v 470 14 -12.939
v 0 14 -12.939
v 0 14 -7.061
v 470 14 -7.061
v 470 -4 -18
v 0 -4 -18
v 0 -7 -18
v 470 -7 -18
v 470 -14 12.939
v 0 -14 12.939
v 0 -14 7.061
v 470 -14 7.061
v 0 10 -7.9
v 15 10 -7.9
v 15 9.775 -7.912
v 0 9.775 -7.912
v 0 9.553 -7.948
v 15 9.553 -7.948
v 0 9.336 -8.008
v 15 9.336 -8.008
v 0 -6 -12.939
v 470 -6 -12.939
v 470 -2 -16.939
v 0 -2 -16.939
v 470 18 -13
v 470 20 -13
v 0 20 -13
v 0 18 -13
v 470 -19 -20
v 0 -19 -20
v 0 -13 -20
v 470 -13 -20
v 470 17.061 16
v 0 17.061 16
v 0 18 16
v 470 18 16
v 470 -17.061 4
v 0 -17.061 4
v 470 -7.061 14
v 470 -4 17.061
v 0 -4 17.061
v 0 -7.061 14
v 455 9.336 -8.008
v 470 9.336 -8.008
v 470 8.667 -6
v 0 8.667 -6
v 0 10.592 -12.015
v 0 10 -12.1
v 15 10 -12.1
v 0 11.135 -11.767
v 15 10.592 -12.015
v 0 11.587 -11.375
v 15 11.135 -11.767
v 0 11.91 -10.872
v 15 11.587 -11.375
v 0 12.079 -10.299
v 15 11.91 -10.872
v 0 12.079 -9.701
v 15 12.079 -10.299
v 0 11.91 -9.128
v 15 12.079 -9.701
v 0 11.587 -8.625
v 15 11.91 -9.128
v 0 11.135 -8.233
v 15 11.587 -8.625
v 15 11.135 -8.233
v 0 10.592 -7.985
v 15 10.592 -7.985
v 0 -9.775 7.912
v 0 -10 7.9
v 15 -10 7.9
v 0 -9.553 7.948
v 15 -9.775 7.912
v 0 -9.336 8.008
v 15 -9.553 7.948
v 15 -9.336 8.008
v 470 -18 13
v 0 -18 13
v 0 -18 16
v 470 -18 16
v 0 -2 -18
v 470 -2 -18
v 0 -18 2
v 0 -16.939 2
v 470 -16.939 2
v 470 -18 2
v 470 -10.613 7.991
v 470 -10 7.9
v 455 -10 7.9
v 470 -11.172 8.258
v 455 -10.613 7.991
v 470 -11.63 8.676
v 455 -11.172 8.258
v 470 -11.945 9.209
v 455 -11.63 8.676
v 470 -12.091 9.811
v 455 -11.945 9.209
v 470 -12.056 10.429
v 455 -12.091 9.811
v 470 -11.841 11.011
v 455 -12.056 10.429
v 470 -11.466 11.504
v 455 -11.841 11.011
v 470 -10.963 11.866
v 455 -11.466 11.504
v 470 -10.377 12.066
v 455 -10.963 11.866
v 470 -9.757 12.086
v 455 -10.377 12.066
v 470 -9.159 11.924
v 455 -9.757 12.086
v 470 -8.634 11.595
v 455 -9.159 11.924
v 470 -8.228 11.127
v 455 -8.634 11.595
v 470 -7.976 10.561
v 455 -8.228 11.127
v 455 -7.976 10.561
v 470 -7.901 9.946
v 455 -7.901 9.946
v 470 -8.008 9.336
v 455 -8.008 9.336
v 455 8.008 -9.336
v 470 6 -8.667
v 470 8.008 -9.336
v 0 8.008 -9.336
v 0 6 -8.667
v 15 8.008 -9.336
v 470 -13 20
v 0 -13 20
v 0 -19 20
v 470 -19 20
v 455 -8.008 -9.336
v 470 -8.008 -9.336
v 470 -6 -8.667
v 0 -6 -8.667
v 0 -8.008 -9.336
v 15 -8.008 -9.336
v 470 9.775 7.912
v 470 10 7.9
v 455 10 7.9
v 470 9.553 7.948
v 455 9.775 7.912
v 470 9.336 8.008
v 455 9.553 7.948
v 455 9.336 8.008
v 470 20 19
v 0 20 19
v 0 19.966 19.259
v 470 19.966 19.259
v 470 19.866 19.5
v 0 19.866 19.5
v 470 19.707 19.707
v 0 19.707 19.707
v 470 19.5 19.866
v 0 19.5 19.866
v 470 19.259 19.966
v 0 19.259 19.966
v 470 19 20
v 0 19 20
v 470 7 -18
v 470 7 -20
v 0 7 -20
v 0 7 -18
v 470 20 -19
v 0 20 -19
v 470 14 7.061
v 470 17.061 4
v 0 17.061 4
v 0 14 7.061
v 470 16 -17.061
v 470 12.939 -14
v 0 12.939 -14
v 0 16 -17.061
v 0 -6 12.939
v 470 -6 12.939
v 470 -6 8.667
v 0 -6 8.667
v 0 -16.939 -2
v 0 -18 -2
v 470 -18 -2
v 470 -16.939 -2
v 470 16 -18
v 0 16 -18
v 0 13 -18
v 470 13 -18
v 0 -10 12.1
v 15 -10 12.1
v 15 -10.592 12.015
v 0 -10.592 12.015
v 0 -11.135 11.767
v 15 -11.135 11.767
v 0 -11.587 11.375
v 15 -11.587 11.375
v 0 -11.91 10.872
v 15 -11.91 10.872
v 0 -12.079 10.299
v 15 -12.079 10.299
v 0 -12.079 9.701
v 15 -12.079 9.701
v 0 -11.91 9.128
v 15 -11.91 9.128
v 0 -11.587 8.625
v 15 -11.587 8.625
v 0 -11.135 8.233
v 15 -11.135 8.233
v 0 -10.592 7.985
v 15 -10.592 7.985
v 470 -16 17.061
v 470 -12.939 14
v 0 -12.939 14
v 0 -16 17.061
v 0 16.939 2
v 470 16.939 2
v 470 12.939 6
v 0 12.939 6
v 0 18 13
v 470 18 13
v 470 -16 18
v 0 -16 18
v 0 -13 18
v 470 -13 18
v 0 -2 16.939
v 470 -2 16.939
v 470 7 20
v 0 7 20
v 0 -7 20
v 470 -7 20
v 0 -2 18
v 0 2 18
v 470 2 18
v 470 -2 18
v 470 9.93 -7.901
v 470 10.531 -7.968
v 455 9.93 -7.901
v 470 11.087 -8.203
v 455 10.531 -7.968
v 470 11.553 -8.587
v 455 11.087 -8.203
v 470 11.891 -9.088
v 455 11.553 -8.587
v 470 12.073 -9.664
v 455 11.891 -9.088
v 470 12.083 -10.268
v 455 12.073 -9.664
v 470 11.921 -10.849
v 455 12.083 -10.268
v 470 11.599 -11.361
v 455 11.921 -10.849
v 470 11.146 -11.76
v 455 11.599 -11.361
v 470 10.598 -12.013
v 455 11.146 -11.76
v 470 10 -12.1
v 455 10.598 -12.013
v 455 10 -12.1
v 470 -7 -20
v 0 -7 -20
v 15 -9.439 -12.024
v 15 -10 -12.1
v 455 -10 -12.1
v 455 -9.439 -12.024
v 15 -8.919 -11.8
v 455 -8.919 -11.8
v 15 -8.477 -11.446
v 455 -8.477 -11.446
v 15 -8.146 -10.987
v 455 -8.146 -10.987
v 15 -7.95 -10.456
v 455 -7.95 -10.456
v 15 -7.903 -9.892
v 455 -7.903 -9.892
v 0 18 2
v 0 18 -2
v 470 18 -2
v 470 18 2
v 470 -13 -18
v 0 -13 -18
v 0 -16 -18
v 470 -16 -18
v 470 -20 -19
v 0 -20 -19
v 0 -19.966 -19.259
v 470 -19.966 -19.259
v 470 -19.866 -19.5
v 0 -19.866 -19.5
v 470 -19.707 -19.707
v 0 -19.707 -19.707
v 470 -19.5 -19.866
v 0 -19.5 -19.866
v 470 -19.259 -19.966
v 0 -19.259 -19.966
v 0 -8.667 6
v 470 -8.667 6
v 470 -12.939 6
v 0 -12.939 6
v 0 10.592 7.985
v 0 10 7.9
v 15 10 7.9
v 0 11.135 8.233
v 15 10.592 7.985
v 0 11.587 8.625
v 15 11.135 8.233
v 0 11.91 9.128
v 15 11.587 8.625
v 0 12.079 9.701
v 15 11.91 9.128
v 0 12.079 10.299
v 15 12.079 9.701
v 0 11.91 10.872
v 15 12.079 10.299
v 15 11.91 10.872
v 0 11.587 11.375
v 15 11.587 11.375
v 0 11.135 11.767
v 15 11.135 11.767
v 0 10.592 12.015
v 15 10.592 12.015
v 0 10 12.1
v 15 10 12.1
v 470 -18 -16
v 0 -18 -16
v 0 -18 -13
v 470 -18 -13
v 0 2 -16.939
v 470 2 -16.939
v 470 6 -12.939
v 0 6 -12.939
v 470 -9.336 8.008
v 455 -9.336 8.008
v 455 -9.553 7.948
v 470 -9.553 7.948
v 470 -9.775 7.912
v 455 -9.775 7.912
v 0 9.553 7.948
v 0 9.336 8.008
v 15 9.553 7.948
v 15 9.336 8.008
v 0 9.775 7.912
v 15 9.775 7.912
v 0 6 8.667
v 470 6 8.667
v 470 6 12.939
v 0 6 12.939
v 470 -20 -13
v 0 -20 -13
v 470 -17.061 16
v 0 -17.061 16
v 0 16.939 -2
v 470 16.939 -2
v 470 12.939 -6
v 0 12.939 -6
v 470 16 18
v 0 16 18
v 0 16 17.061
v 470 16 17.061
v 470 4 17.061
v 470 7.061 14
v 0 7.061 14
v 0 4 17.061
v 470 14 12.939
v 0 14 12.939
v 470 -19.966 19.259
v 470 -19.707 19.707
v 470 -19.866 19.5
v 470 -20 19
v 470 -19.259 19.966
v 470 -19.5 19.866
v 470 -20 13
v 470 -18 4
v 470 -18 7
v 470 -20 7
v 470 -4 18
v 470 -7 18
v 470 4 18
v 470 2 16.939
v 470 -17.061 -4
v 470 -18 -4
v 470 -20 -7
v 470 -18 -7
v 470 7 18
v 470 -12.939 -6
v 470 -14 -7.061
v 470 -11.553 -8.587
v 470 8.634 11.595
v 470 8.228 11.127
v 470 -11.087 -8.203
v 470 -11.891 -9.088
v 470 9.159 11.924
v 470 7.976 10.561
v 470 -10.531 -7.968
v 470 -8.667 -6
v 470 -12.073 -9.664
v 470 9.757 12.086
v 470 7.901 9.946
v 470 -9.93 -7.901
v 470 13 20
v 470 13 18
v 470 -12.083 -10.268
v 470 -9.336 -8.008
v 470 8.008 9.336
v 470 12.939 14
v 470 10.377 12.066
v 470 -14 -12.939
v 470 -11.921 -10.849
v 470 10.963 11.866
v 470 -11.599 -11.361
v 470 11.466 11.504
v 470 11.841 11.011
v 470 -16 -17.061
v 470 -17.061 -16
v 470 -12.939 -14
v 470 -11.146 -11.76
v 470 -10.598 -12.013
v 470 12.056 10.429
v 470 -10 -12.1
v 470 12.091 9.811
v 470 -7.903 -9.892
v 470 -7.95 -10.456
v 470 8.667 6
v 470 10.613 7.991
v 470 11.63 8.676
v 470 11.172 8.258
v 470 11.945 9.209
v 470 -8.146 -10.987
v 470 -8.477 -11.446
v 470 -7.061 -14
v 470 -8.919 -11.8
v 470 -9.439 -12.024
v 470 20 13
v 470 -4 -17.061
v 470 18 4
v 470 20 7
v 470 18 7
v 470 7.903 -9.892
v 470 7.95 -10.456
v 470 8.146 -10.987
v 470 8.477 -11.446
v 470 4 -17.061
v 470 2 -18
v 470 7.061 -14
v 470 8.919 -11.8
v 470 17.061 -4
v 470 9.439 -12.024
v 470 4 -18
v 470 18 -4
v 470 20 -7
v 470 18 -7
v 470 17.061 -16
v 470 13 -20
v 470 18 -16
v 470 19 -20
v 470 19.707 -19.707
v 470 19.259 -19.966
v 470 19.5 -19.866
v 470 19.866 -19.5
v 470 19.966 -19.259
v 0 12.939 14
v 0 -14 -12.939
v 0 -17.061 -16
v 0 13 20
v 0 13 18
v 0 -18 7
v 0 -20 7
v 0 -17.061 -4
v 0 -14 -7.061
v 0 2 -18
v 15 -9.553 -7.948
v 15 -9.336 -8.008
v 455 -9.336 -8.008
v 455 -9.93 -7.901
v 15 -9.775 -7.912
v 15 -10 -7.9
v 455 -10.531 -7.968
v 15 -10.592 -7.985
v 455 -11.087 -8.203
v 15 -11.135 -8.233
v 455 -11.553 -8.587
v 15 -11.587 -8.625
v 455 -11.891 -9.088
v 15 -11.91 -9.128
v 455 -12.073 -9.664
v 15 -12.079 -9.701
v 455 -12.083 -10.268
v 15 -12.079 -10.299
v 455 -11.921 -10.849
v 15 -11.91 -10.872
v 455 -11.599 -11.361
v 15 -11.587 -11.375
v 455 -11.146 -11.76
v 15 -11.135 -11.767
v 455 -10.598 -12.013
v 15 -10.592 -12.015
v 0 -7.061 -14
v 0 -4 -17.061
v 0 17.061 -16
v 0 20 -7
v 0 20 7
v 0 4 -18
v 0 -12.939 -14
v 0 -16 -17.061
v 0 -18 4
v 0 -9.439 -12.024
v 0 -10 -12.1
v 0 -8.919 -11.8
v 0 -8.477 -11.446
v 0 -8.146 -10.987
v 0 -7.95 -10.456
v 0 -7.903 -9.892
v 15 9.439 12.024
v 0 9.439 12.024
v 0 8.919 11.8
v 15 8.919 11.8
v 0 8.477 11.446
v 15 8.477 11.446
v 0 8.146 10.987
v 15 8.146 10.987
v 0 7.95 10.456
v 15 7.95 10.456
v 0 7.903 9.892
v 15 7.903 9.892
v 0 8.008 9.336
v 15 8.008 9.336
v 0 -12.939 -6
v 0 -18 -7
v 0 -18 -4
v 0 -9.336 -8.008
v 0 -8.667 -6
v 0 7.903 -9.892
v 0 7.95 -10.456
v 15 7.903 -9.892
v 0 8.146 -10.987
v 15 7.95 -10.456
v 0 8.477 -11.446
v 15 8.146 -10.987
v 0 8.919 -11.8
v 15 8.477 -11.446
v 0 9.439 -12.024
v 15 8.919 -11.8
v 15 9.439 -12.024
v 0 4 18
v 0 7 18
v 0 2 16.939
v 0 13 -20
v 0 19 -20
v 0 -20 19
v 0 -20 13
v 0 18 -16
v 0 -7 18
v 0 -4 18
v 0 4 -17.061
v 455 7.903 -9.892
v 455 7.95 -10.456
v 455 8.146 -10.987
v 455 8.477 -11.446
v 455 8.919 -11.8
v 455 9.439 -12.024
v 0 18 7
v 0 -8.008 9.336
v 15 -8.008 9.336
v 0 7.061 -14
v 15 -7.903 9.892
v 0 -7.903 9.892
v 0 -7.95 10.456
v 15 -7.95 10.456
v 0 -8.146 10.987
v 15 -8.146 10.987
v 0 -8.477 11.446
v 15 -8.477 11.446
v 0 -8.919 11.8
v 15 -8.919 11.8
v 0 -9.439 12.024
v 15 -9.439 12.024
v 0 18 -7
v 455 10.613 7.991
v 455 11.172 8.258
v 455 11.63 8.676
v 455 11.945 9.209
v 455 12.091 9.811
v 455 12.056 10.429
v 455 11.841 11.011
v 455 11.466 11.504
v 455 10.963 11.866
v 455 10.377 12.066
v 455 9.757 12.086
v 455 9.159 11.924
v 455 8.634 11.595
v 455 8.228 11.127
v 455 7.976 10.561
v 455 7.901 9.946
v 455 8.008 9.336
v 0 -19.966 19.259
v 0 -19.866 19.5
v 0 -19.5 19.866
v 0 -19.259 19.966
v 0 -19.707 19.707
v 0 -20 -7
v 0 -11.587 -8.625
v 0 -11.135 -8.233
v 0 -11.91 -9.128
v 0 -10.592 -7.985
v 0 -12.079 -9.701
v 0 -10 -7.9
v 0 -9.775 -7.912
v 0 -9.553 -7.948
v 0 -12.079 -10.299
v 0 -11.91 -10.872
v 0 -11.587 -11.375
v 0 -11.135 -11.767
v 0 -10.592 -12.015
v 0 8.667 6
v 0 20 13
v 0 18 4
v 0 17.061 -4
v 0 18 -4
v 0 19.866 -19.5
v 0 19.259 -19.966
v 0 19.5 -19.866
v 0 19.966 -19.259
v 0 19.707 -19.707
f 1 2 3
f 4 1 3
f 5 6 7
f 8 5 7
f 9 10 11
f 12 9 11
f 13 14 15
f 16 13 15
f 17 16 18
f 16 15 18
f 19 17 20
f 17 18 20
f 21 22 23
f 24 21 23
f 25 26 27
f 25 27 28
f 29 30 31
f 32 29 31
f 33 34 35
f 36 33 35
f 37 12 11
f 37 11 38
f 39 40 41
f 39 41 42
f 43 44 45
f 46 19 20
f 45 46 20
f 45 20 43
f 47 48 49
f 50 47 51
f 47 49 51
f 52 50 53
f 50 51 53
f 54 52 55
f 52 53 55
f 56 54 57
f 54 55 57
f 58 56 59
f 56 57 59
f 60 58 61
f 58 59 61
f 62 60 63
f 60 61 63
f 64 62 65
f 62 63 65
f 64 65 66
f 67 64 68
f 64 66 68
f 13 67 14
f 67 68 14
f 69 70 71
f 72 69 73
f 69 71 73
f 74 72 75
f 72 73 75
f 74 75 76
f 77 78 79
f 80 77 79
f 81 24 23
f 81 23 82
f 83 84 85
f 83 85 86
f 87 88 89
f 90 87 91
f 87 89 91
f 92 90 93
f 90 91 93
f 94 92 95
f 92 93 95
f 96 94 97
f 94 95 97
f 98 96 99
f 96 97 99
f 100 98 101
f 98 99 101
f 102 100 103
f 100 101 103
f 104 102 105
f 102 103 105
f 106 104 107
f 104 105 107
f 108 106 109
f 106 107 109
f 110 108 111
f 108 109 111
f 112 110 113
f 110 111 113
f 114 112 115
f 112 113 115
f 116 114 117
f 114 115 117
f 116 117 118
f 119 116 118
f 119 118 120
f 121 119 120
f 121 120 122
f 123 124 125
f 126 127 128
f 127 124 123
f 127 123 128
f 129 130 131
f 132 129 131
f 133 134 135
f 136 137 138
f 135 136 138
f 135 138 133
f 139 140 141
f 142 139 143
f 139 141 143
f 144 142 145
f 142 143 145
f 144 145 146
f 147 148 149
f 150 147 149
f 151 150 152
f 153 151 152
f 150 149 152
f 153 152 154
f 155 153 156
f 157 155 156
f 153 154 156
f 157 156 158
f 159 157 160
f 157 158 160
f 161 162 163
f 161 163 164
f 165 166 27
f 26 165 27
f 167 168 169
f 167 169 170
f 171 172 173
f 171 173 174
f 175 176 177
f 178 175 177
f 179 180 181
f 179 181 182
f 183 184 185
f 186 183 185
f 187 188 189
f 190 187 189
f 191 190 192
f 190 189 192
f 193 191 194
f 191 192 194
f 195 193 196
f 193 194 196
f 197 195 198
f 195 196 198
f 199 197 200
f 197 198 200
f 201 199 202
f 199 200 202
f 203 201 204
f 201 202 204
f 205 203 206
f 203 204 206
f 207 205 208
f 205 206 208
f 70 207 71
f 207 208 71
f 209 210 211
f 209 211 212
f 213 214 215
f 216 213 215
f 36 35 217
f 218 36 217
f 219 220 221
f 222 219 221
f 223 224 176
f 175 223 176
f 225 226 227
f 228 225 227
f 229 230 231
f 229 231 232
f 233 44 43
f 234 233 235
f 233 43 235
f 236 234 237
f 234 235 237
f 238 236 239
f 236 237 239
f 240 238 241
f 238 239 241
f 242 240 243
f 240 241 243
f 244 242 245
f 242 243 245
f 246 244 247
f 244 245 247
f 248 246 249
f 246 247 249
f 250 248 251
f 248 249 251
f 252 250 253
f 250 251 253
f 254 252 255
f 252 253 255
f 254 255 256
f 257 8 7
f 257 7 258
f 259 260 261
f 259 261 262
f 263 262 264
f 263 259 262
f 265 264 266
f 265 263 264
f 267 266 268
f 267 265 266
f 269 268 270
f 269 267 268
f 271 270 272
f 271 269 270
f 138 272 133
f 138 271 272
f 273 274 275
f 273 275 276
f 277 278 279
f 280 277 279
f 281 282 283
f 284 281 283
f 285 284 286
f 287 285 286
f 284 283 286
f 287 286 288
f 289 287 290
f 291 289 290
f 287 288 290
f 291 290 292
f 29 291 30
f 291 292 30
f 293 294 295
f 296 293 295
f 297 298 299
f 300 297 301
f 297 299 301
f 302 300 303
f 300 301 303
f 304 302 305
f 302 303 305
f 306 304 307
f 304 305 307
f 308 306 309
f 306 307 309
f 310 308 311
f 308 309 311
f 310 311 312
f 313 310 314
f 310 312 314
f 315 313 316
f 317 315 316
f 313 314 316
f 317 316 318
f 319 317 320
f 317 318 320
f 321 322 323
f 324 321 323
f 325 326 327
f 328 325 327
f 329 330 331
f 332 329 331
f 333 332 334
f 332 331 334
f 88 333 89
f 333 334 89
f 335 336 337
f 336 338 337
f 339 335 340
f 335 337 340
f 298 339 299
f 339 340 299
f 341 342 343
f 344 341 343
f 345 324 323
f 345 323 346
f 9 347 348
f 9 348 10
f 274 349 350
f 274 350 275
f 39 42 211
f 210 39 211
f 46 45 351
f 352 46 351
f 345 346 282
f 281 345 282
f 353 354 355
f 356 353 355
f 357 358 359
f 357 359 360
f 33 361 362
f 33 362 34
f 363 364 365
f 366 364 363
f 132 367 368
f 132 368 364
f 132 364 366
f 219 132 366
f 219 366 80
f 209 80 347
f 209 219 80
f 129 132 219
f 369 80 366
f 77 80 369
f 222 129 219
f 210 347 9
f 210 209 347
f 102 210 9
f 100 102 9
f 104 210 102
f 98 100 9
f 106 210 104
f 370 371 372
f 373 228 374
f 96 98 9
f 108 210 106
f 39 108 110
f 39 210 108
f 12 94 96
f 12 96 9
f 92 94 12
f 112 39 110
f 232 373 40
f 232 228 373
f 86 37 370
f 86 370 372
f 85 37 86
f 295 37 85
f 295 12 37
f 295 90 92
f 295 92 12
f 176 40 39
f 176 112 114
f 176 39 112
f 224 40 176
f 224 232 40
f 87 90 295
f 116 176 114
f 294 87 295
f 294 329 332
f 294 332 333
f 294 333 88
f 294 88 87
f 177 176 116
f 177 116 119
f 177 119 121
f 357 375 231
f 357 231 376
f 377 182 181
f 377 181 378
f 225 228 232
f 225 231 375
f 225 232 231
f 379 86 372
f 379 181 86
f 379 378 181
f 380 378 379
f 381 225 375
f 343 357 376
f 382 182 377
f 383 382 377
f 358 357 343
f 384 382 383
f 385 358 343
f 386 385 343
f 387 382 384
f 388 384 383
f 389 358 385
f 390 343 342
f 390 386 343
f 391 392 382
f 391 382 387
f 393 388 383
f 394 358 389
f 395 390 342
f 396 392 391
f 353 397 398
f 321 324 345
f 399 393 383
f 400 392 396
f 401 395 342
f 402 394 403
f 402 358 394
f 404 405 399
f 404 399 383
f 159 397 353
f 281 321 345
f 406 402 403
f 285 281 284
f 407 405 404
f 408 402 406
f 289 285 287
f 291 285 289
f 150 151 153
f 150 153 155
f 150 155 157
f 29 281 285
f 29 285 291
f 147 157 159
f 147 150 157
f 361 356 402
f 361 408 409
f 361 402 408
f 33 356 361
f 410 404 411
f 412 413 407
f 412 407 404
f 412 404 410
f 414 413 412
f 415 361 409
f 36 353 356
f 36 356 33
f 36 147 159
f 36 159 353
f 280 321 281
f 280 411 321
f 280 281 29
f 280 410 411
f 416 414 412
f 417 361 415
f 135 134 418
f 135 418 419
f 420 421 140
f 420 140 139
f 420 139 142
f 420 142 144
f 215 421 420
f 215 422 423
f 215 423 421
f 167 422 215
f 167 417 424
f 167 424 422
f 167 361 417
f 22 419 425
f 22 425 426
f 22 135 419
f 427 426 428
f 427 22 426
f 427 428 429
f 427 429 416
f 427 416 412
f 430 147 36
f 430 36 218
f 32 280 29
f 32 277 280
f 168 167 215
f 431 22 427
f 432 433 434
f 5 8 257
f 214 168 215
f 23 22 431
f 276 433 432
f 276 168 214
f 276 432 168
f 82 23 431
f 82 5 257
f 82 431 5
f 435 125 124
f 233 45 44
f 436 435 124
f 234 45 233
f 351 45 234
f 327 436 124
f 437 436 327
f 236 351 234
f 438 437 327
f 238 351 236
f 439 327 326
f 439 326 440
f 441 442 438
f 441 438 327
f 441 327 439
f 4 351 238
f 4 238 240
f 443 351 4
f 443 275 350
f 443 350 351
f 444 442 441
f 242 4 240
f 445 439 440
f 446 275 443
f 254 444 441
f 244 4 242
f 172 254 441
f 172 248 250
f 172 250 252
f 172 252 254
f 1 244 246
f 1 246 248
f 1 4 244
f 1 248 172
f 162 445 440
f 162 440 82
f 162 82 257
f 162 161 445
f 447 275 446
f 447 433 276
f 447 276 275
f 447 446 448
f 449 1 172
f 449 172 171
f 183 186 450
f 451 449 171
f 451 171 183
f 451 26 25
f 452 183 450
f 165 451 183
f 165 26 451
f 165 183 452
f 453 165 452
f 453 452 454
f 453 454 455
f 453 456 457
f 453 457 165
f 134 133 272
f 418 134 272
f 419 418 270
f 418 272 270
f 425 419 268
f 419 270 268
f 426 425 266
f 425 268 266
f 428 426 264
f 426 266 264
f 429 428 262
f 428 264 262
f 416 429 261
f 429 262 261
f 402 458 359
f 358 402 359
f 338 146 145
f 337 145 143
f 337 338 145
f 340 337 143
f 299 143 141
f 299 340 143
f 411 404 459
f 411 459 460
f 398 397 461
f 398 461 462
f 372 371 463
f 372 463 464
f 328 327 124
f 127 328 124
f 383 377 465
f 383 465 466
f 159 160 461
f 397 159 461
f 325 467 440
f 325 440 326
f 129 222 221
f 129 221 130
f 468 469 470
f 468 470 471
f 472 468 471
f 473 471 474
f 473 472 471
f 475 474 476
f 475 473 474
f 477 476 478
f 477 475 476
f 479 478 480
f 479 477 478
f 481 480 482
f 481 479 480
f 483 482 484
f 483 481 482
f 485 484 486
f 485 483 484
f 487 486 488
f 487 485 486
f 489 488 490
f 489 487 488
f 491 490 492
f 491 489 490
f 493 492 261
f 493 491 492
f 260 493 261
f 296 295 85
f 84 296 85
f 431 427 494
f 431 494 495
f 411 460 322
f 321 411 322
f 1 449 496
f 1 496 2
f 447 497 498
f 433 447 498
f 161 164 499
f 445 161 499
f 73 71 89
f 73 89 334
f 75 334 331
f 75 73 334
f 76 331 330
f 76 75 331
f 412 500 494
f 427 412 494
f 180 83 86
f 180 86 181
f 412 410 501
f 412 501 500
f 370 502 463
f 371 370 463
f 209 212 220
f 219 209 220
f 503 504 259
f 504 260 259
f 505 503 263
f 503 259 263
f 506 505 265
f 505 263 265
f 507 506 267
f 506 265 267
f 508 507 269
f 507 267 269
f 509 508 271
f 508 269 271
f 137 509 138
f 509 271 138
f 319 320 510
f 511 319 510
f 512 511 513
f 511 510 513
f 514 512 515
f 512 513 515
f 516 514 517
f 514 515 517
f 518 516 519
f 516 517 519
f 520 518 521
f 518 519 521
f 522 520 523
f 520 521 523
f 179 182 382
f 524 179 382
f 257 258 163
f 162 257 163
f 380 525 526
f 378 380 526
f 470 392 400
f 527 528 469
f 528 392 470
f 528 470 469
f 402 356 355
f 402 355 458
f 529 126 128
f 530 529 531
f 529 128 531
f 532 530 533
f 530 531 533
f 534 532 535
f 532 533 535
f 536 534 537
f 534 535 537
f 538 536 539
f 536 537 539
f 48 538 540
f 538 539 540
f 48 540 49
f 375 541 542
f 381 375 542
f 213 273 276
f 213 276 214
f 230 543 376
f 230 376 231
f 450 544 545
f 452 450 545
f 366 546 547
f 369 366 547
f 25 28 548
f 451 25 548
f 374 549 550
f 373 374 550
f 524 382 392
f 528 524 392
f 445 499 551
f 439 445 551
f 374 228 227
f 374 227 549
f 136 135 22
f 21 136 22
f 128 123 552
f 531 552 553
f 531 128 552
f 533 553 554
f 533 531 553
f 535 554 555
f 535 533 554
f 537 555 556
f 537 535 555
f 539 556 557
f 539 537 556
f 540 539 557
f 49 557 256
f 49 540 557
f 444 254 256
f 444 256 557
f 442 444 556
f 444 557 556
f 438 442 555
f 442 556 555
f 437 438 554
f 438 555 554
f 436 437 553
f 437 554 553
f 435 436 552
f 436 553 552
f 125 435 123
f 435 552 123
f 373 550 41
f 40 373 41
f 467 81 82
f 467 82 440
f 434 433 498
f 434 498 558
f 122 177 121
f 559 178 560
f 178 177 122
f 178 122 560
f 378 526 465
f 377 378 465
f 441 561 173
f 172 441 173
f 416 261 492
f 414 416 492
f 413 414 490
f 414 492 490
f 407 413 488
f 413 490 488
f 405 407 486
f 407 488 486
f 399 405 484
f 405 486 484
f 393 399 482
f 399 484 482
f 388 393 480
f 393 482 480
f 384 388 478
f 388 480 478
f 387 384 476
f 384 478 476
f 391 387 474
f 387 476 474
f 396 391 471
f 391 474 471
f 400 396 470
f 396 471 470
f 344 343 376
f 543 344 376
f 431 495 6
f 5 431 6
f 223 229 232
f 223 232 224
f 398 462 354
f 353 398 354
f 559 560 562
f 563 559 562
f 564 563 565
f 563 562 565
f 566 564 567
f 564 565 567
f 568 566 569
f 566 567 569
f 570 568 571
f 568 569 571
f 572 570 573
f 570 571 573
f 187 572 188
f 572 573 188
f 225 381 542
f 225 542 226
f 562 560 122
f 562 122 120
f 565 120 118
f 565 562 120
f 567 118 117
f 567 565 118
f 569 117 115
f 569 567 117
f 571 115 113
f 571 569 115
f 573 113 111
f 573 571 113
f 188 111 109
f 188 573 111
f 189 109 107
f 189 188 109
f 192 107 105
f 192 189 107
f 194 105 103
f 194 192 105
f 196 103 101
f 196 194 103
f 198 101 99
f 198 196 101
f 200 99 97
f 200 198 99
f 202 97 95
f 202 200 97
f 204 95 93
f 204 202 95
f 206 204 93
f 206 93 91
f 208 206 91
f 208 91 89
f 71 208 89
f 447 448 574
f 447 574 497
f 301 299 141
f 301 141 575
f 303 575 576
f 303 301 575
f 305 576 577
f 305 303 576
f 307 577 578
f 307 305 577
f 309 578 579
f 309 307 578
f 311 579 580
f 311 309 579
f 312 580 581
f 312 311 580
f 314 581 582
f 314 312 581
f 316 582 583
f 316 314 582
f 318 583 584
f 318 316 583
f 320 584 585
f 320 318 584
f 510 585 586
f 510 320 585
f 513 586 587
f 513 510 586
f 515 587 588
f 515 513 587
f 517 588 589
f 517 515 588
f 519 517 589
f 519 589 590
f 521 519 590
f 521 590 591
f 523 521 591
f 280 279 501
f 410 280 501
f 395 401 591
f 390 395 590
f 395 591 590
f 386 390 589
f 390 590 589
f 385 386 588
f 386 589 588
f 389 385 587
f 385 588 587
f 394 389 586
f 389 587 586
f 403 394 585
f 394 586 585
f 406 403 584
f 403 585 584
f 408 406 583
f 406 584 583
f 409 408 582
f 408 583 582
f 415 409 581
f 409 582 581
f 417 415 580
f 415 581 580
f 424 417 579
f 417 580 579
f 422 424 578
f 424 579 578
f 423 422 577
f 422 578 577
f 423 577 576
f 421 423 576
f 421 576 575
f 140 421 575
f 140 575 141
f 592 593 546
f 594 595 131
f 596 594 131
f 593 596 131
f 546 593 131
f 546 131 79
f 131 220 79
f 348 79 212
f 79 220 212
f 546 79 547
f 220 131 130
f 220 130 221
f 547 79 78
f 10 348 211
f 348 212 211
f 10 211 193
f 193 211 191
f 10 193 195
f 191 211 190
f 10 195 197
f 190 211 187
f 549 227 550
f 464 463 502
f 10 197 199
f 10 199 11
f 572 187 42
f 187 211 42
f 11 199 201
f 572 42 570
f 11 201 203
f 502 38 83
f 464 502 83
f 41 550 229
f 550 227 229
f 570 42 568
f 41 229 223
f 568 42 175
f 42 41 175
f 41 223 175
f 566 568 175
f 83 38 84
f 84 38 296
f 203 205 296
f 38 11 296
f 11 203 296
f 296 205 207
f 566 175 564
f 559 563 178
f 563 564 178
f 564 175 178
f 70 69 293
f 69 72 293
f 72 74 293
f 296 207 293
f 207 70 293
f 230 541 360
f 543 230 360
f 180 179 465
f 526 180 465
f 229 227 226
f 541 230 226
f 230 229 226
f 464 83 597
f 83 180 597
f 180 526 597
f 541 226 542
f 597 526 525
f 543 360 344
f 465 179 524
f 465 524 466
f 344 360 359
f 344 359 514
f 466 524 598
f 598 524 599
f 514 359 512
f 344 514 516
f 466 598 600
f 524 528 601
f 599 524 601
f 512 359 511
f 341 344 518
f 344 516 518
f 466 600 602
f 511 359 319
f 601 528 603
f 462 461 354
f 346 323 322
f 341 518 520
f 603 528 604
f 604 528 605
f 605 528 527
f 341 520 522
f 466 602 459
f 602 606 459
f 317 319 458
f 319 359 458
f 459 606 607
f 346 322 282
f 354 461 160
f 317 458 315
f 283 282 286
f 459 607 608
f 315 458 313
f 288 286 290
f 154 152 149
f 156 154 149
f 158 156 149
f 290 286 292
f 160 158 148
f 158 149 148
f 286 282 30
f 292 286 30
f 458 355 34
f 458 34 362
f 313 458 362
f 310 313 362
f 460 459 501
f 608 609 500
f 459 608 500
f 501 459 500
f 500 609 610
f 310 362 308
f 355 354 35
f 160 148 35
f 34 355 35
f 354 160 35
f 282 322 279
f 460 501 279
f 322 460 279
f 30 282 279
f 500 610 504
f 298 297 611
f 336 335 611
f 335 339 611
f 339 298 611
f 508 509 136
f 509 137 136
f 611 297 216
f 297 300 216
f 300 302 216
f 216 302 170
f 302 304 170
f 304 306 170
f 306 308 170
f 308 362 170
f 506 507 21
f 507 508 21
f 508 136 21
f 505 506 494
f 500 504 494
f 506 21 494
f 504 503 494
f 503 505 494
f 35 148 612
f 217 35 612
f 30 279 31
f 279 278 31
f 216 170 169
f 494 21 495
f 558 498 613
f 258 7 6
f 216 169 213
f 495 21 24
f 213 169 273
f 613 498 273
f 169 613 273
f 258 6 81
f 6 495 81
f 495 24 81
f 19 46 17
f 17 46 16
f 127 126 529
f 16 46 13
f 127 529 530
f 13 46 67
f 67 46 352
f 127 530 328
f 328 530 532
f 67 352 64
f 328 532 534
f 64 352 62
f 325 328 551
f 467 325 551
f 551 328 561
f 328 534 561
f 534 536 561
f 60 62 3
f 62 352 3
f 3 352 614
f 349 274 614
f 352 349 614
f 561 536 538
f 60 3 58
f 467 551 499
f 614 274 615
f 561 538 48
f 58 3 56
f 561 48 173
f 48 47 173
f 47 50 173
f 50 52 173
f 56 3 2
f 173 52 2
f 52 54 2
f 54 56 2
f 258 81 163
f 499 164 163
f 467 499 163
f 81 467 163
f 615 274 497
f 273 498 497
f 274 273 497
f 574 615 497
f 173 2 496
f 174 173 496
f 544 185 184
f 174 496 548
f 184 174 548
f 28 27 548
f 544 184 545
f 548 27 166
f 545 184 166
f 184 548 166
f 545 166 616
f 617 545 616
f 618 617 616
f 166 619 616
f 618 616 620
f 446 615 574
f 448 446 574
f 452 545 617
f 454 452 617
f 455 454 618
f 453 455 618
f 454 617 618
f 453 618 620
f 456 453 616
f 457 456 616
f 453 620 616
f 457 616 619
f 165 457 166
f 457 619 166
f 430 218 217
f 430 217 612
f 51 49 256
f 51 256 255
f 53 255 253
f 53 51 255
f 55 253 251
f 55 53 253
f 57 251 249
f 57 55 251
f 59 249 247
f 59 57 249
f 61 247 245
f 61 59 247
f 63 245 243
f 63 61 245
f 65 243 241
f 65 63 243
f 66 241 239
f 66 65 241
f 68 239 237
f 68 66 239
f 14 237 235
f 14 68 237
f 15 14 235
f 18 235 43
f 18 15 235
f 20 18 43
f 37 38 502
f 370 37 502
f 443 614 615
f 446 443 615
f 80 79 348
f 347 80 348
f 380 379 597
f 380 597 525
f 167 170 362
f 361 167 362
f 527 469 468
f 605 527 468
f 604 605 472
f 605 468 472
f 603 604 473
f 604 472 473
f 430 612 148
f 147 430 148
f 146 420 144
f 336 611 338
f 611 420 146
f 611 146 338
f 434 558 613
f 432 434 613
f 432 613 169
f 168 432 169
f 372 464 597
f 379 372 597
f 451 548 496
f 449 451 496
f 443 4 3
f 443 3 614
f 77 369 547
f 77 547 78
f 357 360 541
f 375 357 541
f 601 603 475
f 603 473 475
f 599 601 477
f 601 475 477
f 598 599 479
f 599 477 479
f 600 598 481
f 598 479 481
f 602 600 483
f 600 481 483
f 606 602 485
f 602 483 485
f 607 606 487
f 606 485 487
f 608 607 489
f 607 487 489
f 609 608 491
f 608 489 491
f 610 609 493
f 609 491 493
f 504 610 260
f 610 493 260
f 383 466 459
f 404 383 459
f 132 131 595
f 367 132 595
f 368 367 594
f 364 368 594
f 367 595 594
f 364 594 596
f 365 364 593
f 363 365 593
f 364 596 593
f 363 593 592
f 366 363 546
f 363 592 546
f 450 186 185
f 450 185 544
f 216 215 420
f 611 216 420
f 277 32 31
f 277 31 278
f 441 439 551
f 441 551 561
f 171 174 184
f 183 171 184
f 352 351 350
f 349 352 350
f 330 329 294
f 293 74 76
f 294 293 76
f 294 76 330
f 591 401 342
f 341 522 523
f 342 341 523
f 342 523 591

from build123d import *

# Parameters (mm, degrees)
BOSS_EXTRUDE1_DEPTH = 470
SKETCH10_R          = 2.1
BOSS_EXTRUDE4_DEPTH = 15
BOSS_EXTRUDE5_START = -15
SKETCH11_R          = 2.1
BOSS_EXTRUDE5_DEPTH = 15
TAPPED_HOLE3_D      = 4.2
TAPPED_HOLE3_DEPTH  = 15
TAPPED_HOLE4_D      = 4.2


with BuildPart() as part:
    # Sketch1 → Boss-Extrude1 (new body)
    with BuildSketch(Plane(origin=(0, 0, 0), x_dir=(0, 0, -1), z_dir=(1, 0, 0))):
        with BuildLine():
            Line((-20, 19), (-20, 13))
            Line((-20, 13), (-18, 13))
            Line((-18, 13), (-18, 16))
            Line((-18, 16), (-17.060660172, 16))
            Line((-17.060660172, 16), (-14, 12.939339828))
            Line((-14, 12.939339828), (-14, 7.060660172))
            Line((-14, 7.060660172), (-17.060660172, 4))
            Line((-17.060660172, 4), (-18, 4))
            Line((-18, 4), (-18, 7))
            Line((-18, 7), (-20, 7))
            Line((-20, 7), (-20, -7))
            Line((-20, -7), (-18, -7))
            Line((-18, -7), (-18, -4))
            Line((-18, -4), (-17.060660172, -4))
            Line((-17.060660172, -4), (-14, -7.060660172))
            Line((-14, -7.060660172), (-14, -12.939339828))
            Line((-14, -12.939339828), (-17.060660172, -16))
            Line((-17.060660172, -16), (-18, -16))
            Line((-18, -16), (-18, -13))
            Line((-18, -13), (-20, -13))
            Line((-20, -13), (-20, -19))
            ThreePointArc((-20, -19), (-19.707106781, -19.707106781), (-19, -20))
            Line((-19, -20), (-13, -20))
            Line((-13, -20), (-13, -18))
            Line((-13, -18), (-16, -18))
            Line((-16, -18), (-16, -17.060660172))
            Line((-16, -17.060660172), (-12.939339828, -14))
            Line((-12.939339828, -14), (-7.060660172, -14))
            Line((-7.060660172, -14), (-4, -17.060660172))
            Line((-4, -17.060660172), (-4, -18))
            Line((-4, -18), (-7, -18))
            Line((-7, -18), (-7, -20))
            Line((-7, -20), (7, -20))
            Line((7, -20), (7, -18))
            Line((7, -18), (4, -18))
            Line((4, -18), (4, -17.060660172))
            Line((4, -17.060660172), (7.060660172, -14))
            Line((7.060660172, -14), (12.939339828, -14))
            Line((12.939339828, -14), (16, -17.060660172))
            Line((16, -17.060660172), (16, -18))
            Line((16, -18), (13, -18))
            Line((13, -18), (13, -20))
            Line((13, -20), (19, -20))
            ThreePointArc((19, -20), (19.707106781, -19.707106781), (20, -19))
            Line((20, -19), (20, -13))
            Line((20, -13), (18, -13))
            Line((18, -13), (18, -16))
            Line((18, -16), (17.060660172, -16))
            Line((17.060660172, -16), (14, -12.939339828))
            Line((14, -12.939339828), (14, -7.060660172))
            Line((14, -7.060660172), (17.060660172, -4))
            Line((17.060660172, -4), (18, -4))
            Line((18, -4), (18, -7))
            Line((18, -7), (20, -7))
            Line((20, -7), (20, 7))
            Line((20, 7), (18, 7))
            Line((18, 7), (18, 4))
            Line((18, 4), (17.060660172, 4))
            Line((17.060660172, 4), (14, 7.060660172))
            Line((14, 7.060660172), (14, 12.939339828))
            Line((14, 12.939339828), (17.060660172, 16))
            Line((17.060660172, 16), (18, 16))
            Line((18, 16), (18, 13))
            Line((18, 13), (20, 13))
            Line((20, 13), (20, 19))
            ThreePointArc((20, 19), (19.707106781, 19.707106781), (19, 20))
            Line((19, 20), (13, 20))
            Line((13, 20), (13, 18))
            Line((13, 18), (16, 18))
            Line((16, 18), (16, 17.060660172))
            Line((16, 17.060660172), (12.939339828, 14))
            Line((12.939339828, 14), (7.060660172, 14))
            Line((7.060660172, 14), (4, 17.060660172))
            Line((4, 17.060660172), (4, 18))
            Line((4, 18), (7, 18))
            Line((7, 18), (7, 20))
            Line((7, 20), (-7, 20))
            Line((-7, 20), (-7, 18))
            Line((-7, 18), (-4, 18))
            Line((-4, 18), (-4, 17.060660172))
            Line((-4, 17.060660172), (-7.060660172, 14))
            Line((-7.060660172, 14), (-12.939339828, 14))
            Line((-12.939339828, 14), (-16, 17.060660172))
            Line((-16, 17.060660172), (-16, 18))
            Line((-16, 18), (-13, 18))
            Line((-13, 18), (-13, 20))
            Line((-13, 20), (-19, 20))
            ThreePointArc((-19, 20), (-19.707106781, 19.707106781), (-20, 19))
        make_face()
        with BuildLine():
            Line((-16.939339828, 2), (-18, 2))
            Line((-18, 2), (-18, -2))
            Line((-18, -2), (-16.939339828, -2))
            Line((-16.939339828, -2), (-12.939339828, -6))
            Line((-12.939339828, -6), (-8.666662697, -6))
            Line((-8.666662697, -6), (-9.335919912, -8.007765667))
            ThreePointArc((-9.335919912, -8.007765667), (-11.48492424, -11.48492424), (-8.007765667, -9.335919912))
            Line((-8.007765667, -9.335919912), (-6, -8.666662697))
            Line((-6, -8.666662697), (-6, -12.939339828))
            Line((-6, -12.939339828), (-2, -16.939339828))
            Line((-2, -16.939339828), (-2, -18))
            Line((-2, -18), (2, -18))
            Line((2, -18), (2, -16.939339828))
            Line((2, -16.939339828), (6, -12.939339828))
            Line((6, -12.939339828), (6, -8.666662697))
            Line((6, -8.666662697), (8.007765667, -9.335919912))
            ThreePointArc((8.007765667, -9.335919912), (11.48492424, -11.48492424), (9.335919912, -8.007765667))
            Line((9.335919912, -8.007765667), (8.666662697, -6))
            Line((8.666662697, -6), (12.939339828, -6))
            Line((12.939339828, -6), (16.939339828, -2))
            Line((16.939339828, -2), (18, -2))
            Line((18, -2), (18, 2))
            Line((18, 2), (16.939339828, 2))
            Line((16.939339828, 2), (12.939339828, 6))
            Line((12.939339828, 6), (8.666662697, 6))
            Line((8.666662697, 6), (9.335919912, 8.007765667))
            ThreePointArc((9.335919912, 8.007765667), (11.48492424, 11.48492424), (8.007765667, 9.335919912))
            Line((8.007765667, 9.335919912), (6, 8.666662697))
            Line((6, 8.666662697), (6, 12.939339828))
            Line((6, 12.939339828), (2, 16.939339828))
            Line((2, 16.939339828), (2, 18))
            Line((2, 18), (-2, 18))
            Line((-2, 18), (-2, 16.939339828))
            Line((-2, 16.939339828), (-6, 12.939339828))
            Line((-6, 12.939339828), (-6, 8.666662697))
            Line((-6, 8.666662697), (-8.007765667, 9.335919912))
            ThreePointArc((-8.007765667, 9.335919912), (-11.48492424, 11.48492424), (-9.335919912, 8.007765667))
            Line((-9.335919912, 8.007765667), (-8.666662697, 6))
            Line((-8.666662697, 6), (-12.939339828, 6))
            Line((-12.939339828, 6), (-16.939339828, 2))
        make_face(mode=Mode.SUBTRACT)
    extrude(amount=BOSS_EXTRUDE1_DEPTH)

    # Sketch10 → Boss-Extrude4 (add)
    with BuildSketch(Plane(origin=(0, 0, 0), x_dir=(0, 0, -1), z_dir=(1, 0, 0))):
        with Locations((-10, -10)):
            Circle(SKETCH10_R)
        with Locations((10, -10)):
            Circle(SKETCH10_R)
        with Locations((10, 10)):
            Circle(SKETCH10_R)
        with Locations((-10, 10)):
            Circle(SKETCH10_R)
    extrude(amount=BOSS_EXTRUDE4_DEPTH)

    # Sketch11 → Boss-Extrude5 (add)
    with BuildSketch(Plane(origin=(470, 0, 0), x_dir=(0, 0, -1), z_dir=(1, 0, 0)).offset(BOSS_EXTRUDE5_START)):
        with Locations((10, -10)):
            Circle(SKETCH11_R)
        with Locations((-10, -10)):
            Circle(SKETCH11_R)
        with Locations((-10, 10)):
            Circle(SKETCH11_R)
        with Locations((10, 10)):
            Circle(SKETCH11_R)
    extrude(amount=BOSS_EXTRUDE5_DEPTH)

    # Tapped Hole3
    with Locations(Plane(origin=(0, 0, 73.523605606), x_dir=(0, 0, -1), z_dir=(-1, 0, 0))):
        with Locations((63.523605606, -10), (83.523605606, -10), (63.523605606, 10), (83.523605606, 10)):
            Hole(TAPPED_HOLE3_D / 2, depth=TAPPED_HOLE3_DEPTH)

    # Tapped Hole4 (through all)
    with Locations(Plane(origin=(470, 0, -145.629349724), x_dir=(0, 0, 1), z_dir=(1, 0, 0))):
        with Locations((135.629349724, -10), (155.629349724, -10), (135.629349724, 10), (155.629349724, 10)):
            Hole(TAPPED_HOLE4_D / 2)


solid = part.part
